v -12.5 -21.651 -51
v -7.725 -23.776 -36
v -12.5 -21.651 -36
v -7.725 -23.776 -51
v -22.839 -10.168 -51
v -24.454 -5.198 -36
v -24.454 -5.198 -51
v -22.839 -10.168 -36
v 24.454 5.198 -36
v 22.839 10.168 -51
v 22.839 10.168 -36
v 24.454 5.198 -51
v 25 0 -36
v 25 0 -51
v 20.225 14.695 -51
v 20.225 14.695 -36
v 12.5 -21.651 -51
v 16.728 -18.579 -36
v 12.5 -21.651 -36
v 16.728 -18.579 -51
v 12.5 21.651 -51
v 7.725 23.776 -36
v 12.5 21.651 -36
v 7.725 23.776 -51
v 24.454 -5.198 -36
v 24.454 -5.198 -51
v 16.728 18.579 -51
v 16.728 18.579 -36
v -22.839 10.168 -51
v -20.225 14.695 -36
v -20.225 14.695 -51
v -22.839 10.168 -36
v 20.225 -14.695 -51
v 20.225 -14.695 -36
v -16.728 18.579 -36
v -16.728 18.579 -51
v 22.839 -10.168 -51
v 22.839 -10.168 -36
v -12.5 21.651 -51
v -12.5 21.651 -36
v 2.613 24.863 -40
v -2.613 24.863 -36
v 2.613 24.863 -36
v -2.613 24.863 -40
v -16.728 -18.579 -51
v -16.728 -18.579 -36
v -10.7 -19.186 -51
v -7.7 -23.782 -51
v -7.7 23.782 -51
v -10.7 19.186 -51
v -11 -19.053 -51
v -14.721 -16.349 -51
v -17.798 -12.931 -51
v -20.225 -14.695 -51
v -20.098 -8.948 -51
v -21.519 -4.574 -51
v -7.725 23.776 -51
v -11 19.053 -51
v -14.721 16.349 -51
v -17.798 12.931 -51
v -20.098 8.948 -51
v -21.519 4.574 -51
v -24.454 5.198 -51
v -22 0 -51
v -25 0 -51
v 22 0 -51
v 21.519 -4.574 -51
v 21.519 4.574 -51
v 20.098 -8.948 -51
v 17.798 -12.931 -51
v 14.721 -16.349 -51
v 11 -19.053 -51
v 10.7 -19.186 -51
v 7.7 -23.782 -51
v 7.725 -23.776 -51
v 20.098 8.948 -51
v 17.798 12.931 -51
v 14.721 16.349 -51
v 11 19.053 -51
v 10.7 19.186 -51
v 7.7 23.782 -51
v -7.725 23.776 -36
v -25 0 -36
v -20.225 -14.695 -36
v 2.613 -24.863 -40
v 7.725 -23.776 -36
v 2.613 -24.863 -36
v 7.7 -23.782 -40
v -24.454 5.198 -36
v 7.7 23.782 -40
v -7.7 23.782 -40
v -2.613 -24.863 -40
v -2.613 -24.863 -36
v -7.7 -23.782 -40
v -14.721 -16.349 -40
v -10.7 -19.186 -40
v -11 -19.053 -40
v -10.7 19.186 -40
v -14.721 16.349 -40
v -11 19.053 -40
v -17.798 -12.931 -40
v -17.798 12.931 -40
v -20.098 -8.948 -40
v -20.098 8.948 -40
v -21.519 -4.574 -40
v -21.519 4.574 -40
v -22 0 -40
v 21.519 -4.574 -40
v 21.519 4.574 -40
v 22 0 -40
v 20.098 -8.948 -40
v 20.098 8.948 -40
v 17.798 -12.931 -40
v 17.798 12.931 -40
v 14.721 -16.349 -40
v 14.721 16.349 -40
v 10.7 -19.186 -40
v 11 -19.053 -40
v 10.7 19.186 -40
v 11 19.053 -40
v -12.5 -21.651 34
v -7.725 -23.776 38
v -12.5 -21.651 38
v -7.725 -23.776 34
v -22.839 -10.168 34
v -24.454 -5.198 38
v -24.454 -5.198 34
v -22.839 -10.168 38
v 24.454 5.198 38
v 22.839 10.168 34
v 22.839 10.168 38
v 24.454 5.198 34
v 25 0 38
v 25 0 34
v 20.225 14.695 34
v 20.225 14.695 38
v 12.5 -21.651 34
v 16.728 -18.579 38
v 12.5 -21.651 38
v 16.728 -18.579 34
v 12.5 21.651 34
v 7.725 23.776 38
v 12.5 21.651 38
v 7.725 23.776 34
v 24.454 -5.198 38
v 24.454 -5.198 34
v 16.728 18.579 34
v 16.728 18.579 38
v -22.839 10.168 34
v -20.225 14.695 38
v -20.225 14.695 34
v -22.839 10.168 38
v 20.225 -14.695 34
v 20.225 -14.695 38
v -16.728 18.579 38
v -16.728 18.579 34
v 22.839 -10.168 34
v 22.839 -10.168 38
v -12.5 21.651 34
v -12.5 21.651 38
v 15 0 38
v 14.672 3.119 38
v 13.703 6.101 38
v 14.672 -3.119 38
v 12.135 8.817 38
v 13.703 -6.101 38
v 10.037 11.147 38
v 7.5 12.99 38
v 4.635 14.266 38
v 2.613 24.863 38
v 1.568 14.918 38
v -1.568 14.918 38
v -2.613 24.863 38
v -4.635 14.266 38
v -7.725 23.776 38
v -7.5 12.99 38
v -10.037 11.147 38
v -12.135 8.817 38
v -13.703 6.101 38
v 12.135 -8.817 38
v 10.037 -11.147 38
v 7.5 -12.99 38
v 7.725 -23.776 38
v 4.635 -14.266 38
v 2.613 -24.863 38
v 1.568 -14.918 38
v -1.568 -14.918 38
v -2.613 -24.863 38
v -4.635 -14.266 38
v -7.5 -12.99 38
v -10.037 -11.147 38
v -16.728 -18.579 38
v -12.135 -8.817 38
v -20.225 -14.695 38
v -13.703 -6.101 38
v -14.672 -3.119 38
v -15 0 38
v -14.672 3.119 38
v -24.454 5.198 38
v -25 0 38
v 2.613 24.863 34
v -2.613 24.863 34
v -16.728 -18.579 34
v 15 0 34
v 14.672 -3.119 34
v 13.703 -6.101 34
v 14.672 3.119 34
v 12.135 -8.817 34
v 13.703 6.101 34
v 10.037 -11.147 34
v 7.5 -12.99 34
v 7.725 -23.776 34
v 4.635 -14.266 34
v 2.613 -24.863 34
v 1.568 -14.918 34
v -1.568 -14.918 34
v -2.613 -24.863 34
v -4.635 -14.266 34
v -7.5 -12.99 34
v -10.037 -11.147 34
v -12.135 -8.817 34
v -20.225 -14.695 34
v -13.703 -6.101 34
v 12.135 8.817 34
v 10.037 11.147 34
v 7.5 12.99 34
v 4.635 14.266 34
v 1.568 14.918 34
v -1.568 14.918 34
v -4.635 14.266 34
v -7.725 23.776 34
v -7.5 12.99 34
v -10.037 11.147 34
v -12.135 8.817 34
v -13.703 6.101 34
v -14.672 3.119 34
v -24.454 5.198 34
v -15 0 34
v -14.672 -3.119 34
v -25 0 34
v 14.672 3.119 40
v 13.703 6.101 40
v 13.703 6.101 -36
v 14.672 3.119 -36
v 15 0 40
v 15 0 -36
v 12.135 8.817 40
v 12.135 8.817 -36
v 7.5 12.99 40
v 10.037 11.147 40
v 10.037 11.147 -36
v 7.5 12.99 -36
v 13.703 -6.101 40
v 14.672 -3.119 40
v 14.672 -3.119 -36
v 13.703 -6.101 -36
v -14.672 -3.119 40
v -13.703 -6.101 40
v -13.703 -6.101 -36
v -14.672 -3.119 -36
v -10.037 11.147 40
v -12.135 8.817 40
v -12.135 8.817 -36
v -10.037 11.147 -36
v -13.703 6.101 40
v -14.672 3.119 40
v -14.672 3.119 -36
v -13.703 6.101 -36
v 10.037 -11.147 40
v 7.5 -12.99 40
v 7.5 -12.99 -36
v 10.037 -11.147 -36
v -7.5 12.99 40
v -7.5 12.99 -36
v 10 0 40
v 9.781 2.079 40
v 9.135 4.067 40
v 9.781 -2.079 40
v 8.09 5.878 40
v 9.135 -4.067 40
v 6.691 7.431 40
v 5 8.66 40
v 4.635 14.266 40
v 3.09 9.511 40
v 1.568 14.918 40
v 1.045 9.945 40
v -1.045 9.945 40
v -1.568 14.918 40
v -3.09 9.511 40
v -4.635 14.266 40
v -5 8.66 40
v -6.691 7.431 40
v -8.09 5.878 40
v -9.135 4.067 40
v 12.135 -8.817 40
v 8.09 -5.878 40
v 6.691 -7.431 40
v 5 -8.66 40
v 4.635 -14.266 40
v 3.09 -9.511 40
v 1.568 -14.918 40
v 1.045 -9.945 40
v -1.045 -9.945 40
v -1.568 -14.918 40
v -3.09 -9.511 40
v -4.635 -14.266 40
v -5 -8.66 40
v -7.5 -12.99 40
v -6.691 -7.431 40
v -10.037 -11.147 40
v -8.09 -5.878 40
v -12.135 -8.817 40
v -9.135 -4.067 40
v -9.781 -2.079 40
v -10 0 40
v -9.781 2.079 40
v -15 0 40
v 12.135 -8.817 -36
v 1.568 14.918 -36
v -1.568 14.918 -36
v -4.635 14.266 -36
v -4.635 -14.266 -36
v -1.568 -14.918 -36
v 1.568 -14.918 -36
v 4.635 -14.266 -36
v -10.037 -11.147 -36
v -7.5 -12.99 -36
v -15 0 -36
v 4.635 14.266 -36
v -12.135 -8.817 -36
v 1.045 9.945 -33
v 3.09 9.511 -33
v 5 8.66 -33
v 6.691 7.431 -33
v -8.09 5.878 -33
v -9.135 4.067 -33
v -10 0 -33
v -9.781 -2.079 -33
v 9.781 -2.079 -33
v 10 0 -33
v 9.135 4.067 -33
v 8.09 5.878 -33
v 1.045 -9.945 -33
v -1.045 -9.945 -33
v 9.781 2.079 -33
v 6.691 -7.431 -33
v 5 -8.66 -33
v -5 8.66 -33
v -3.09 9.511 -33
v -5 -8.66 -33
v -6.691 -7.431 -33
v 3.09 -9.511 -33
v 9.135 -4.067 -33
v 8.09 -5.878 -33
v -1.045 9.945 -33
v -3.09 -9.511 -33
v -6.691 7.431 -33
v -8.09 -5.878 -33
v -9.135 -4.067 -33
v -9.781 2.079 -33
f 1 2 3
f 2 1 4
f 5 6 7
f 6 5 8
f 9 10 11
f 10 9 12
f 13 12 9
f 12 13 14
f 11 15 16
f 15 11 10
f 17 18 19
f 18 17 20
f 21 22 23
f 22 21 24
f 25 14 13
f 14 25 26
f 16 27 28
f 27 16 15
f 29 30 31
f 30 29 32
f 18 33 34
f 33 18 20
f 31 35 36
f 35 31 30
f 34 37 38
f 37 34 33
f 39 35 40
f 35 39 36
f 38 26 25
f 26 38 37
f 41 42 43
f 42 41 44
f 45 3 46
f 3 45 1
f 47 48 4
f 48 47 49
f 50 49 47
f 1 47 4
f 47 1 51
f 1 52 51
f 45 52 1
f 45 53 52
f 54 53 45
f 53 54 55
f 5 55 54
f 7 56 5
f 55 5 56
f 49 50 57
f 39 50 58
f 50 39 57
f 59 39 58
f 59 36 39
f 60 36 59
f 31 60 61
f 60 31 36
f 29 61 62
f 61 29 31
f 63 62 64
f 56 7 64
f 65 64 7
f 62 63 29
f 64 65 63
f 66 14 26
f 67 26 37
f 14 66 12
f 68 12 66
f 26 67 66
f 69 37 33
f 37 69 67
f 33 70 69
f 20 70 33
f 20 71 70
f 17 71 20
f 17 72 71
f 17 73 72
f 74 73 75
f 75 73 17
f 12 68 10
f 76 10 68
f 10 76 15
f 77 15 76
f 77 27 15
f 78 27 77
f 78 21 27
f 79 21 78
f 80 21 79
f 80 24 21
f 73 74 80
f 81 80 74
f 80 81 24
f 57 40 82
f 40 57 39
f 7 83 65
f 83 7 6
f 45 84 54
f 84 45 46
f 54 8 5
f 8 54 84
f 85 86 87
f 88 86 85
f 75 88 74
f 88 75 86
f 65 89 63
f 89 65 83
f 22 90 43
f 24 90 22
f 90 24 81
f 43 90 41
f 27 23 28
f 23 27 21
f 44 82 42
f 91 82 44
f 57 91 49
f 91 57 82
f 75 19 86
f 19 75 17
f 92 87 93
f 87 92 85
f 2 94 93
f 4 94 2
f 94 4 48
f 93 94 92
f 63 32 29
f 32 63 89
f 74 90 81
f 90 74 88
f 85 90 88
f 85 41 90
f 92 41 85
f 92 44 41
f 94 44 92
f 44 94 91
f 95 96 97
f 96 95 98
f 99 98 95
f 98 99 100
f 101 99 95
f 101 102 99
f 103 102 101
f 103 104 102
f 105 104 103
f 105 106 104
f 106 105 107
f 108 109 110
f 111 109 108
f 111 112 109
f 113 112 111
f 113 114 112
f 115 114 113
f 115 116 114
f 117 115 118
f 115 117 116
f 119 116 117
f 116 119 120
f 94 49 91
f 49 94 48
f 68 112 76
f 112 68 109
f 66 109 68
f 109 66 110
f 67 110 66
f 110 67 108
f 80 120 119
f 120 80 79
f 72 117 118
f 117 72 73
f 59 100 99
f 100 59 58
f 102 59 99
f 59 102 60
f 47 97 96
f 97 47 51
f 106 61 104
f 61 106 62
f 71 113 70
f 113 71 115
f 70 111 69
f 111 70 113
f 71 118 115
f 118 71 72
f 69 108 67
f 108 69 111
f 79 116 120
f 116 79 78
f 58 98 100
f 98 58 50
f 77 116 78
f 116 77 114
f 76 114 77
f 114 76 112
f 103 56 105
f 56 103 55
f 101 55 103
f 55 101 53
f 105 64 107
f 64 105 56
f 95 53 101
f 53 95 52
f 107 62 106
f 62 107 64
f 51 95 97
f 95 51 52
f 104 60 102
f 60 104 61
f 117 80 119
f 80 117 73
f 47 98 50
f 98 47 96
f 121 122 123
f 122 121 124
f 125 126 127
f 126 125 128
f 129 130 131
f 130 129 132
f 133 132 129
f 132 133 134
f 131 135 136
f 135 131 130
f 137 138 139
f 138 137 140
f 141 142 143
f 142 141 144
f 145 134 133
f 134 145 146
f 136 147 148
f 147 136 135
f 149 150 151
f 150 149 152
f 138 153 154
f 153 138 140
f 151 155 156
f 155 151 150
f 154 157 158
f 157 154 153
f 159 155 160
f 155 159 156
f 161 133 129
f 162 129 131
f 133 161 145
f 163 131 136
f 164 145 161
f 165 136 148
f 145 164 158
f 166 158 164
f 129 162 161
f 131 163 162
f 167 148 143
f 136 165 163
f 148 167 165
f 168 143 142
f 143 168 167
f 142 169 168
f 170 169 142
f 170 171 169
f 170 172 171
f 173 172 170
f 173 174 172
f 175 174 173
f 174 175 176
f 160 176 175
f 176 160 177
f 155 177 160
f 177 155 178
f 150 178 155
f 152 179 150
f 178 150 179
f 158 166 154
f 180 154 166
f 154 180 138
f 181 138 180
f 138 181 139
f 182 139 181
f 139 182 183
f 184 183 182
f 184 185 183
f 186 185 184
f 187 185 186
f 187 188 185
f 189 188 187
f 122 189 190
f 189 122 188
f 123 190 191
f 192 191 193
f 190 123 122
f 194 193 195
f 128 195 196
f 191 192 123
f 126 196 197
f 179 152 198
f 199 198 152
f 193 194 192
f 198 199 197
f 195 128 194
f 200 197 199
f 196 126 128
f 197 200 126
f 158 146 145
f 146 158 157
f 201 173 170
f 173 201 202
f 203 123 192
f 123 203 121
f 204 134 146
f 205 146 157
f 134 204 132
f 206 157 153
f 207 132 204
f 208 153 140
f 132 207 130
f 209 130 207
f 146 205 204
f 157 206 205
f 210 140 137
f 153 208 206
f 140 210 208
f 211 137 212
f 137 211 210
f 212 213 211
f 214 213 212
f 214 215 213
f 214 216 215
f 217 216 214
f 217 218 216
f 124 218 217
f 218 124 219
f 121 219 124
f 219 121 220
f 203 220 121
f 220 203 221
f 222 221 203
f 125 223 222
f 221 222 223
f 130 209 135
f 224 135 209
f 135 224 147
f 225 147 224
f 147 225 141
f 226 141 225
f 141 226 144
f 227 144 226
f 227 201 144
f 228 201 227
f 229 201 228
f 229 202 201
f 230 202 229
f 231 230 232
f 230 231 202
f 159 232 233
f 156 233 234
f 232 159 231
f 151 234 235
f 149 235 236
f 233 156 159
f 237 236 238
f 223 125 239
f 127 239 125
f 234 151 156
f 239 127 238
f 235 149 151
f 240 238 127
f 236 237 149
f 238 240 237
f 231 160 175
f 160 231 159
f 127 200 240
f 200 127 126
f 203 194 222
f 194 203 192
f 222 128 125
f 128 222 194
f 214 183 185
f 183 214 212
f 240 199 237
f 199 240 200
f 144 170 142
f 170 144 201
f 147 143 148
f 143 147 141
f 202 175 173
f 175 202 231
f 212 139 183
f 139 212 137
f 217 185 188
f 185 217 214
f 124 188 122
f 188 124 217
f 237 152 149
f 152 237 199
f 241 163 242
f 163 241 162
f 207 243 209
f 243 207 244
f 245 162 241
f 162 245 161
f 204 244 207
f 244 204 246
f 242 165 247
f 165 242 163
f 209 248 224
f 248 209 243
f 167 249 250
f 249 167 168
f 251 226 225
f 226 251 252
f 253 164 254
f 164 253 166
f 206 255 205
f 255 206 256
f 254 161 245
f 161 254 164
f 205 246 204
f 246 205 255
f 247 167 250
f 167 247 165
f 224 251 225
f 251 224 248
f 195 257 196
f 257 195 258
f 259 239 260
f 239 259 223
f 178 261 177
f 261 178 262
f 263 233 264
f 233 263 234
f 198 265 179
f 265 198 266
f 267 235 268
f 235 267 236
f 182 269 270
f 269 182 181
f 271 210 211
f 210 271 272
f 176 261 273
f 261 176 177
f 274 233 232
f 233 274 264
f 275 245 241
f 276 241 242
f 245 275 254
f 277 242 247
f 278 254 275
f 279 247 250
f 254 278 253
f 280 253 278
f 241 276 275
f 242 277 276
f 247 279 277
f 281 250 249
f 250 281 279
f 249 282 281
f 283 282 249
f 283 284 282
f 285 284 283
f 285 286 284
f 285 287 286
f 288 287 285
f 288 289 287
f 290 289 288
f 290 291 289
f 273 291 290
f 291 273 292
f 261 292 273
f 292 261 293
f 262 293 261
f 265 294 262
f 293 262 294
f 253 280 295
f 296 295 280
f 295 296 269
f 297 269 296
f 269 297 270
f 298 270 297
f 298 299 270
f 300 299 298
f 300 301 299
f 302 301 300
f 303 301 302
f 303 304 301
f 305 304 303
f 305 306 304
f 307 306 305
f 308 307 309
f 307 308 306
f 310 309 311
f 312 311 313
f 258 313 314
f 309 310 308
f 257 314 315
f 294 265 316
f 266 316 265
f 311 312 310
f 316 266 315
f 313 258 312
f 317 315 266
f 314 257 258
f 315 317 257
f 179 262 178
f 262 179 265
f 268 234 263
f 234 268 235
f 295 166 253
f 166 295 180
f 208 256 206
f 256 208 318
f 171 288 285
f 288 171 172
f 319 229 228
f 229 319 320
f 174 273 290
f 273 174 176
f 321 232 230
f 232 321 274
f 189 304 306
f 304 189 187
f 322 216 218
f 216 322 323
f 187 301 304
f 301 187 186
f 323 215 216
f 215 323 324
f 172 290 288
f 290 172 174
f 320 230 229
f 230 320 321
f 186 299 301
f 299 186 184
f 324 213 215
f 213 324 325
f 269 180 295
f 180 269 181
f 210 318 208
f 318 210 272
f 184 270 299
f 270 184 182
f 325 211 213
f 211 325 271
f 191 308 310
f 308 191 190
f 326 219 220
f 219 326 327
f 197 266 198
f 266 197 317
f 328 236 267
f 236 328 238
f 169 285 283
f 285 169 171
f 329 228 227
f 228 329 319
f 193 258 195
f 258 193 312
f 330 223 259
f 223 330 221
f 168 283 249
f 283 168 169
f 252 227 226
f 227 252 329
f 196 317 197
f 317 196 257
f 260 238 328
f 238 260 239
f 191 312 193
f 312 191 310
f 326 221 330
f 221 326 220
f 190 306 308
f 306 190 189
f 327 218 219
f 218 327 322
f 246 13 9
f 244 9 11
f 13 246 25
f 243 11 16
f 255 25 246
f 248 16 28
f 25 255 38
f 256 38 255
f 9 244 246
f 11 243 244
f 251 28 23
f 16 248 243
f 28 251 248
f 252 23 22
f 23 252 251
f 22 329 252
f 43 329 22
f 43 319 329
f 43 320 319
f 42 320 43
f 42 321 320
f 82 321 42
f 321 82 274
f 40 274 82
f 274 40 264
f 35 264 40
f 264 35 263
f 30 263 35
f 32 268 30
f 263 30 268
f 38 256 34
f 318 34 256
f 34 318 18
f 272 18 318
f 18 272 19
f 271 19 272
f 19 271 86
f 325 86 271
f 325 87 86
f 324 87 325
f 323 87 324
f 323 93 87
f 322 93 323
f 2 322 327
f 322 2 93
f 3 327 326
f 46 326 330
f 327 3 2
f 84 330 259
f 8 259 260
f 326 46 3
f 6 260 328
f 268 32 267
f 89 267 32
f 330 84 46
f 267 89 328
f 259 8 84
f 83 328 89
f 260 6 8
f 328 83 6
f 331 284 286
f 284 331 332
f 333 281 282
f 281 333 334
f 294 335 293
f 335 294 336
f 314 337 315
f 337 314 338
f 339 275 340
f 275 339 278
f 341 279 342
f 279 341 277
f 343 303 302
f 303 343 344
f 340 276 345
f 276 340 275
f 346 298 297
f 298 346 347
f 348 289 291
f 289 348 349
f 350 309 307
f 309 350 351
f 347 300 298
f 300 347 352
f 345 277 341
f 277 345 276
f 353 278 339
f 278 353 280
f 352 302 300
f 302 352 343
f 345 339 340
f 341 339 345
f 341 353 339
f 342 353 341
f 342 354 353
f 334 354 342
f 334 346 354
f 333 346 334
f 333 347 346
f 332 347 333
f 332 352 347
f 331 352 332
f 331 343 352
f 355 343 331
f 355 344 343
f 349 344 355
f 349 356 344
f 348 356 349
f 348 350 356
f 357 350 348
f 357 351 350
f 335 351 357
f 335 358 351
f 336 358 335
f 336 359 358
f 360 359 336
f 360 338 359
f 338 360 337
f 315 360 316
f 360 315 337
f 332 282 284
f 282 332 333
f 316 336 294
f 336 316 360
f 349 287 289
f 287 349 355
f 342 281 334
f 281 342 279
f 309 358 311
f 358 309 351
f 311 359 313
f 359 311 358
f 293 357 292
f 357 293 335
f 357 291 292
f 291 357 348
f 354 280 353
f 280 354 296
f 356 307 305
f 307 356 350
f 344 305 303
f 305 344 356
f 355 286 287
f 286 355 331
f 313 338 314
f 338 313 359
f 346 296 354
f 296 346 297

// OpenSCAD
$fs = 0.01;

tableThickness = 15.4;
tableDepth = 14;
wallThickness = 3;
spoolLength = 80;
spoolRadius = 15;
spoolWallThickness = 5;
spoolRimOffset = 4;
spoolRimRadius = 10;
spoolRimThickness = 4;
totalRadius = spoolRadius + spoolRimRadius;

difference() {
    union() {
        // Top Rim
        translate([0, 0, spoolLength / 2 - spoolRimOffset])
            cylinder(h = spoolRimThickness, r = spoolRadius + spoolRimRadius, center = true);
        // Main Cylinder
        cylinder(h = spoolLength, r = spoolRadius, center = true);

        // Holder part
        translate([0, 0, -spoolLength / 2 - tableDepth / 2])
            difference() {
                difference() {
                    translate([0, 0, wallThickness])
                        cylinder(h = tableDepth, r = spoolRadius + spoolRimRadius, center = true);
                    cube([tableThickness, totalRadius * 2, tableDepth], center = true);
                }
                difference() {
                    translate([0, 0, wallThickness])
                        cylinder(h = tableDepth, r = spoolRadius + spoolRimRadius - wallThickness, center = true);
                    cube([tableThickness + 2 * wallThickness, totalRadius * 2, tableDepth], center = true);
                }
            }

        // Lower Rim
        translate([0, 0, -spoolLength / 2 + 2])
            cylinder(h = spoolRimThickness, r = spoolRadius+spoolRimRadius, center = true);
    }
    translate([0, 0, tableDepth / 4])
        cylinder(h = spoolLength - tableDepth / 2, r = spoolRadius - spoolWallThickness, center = true);
}
